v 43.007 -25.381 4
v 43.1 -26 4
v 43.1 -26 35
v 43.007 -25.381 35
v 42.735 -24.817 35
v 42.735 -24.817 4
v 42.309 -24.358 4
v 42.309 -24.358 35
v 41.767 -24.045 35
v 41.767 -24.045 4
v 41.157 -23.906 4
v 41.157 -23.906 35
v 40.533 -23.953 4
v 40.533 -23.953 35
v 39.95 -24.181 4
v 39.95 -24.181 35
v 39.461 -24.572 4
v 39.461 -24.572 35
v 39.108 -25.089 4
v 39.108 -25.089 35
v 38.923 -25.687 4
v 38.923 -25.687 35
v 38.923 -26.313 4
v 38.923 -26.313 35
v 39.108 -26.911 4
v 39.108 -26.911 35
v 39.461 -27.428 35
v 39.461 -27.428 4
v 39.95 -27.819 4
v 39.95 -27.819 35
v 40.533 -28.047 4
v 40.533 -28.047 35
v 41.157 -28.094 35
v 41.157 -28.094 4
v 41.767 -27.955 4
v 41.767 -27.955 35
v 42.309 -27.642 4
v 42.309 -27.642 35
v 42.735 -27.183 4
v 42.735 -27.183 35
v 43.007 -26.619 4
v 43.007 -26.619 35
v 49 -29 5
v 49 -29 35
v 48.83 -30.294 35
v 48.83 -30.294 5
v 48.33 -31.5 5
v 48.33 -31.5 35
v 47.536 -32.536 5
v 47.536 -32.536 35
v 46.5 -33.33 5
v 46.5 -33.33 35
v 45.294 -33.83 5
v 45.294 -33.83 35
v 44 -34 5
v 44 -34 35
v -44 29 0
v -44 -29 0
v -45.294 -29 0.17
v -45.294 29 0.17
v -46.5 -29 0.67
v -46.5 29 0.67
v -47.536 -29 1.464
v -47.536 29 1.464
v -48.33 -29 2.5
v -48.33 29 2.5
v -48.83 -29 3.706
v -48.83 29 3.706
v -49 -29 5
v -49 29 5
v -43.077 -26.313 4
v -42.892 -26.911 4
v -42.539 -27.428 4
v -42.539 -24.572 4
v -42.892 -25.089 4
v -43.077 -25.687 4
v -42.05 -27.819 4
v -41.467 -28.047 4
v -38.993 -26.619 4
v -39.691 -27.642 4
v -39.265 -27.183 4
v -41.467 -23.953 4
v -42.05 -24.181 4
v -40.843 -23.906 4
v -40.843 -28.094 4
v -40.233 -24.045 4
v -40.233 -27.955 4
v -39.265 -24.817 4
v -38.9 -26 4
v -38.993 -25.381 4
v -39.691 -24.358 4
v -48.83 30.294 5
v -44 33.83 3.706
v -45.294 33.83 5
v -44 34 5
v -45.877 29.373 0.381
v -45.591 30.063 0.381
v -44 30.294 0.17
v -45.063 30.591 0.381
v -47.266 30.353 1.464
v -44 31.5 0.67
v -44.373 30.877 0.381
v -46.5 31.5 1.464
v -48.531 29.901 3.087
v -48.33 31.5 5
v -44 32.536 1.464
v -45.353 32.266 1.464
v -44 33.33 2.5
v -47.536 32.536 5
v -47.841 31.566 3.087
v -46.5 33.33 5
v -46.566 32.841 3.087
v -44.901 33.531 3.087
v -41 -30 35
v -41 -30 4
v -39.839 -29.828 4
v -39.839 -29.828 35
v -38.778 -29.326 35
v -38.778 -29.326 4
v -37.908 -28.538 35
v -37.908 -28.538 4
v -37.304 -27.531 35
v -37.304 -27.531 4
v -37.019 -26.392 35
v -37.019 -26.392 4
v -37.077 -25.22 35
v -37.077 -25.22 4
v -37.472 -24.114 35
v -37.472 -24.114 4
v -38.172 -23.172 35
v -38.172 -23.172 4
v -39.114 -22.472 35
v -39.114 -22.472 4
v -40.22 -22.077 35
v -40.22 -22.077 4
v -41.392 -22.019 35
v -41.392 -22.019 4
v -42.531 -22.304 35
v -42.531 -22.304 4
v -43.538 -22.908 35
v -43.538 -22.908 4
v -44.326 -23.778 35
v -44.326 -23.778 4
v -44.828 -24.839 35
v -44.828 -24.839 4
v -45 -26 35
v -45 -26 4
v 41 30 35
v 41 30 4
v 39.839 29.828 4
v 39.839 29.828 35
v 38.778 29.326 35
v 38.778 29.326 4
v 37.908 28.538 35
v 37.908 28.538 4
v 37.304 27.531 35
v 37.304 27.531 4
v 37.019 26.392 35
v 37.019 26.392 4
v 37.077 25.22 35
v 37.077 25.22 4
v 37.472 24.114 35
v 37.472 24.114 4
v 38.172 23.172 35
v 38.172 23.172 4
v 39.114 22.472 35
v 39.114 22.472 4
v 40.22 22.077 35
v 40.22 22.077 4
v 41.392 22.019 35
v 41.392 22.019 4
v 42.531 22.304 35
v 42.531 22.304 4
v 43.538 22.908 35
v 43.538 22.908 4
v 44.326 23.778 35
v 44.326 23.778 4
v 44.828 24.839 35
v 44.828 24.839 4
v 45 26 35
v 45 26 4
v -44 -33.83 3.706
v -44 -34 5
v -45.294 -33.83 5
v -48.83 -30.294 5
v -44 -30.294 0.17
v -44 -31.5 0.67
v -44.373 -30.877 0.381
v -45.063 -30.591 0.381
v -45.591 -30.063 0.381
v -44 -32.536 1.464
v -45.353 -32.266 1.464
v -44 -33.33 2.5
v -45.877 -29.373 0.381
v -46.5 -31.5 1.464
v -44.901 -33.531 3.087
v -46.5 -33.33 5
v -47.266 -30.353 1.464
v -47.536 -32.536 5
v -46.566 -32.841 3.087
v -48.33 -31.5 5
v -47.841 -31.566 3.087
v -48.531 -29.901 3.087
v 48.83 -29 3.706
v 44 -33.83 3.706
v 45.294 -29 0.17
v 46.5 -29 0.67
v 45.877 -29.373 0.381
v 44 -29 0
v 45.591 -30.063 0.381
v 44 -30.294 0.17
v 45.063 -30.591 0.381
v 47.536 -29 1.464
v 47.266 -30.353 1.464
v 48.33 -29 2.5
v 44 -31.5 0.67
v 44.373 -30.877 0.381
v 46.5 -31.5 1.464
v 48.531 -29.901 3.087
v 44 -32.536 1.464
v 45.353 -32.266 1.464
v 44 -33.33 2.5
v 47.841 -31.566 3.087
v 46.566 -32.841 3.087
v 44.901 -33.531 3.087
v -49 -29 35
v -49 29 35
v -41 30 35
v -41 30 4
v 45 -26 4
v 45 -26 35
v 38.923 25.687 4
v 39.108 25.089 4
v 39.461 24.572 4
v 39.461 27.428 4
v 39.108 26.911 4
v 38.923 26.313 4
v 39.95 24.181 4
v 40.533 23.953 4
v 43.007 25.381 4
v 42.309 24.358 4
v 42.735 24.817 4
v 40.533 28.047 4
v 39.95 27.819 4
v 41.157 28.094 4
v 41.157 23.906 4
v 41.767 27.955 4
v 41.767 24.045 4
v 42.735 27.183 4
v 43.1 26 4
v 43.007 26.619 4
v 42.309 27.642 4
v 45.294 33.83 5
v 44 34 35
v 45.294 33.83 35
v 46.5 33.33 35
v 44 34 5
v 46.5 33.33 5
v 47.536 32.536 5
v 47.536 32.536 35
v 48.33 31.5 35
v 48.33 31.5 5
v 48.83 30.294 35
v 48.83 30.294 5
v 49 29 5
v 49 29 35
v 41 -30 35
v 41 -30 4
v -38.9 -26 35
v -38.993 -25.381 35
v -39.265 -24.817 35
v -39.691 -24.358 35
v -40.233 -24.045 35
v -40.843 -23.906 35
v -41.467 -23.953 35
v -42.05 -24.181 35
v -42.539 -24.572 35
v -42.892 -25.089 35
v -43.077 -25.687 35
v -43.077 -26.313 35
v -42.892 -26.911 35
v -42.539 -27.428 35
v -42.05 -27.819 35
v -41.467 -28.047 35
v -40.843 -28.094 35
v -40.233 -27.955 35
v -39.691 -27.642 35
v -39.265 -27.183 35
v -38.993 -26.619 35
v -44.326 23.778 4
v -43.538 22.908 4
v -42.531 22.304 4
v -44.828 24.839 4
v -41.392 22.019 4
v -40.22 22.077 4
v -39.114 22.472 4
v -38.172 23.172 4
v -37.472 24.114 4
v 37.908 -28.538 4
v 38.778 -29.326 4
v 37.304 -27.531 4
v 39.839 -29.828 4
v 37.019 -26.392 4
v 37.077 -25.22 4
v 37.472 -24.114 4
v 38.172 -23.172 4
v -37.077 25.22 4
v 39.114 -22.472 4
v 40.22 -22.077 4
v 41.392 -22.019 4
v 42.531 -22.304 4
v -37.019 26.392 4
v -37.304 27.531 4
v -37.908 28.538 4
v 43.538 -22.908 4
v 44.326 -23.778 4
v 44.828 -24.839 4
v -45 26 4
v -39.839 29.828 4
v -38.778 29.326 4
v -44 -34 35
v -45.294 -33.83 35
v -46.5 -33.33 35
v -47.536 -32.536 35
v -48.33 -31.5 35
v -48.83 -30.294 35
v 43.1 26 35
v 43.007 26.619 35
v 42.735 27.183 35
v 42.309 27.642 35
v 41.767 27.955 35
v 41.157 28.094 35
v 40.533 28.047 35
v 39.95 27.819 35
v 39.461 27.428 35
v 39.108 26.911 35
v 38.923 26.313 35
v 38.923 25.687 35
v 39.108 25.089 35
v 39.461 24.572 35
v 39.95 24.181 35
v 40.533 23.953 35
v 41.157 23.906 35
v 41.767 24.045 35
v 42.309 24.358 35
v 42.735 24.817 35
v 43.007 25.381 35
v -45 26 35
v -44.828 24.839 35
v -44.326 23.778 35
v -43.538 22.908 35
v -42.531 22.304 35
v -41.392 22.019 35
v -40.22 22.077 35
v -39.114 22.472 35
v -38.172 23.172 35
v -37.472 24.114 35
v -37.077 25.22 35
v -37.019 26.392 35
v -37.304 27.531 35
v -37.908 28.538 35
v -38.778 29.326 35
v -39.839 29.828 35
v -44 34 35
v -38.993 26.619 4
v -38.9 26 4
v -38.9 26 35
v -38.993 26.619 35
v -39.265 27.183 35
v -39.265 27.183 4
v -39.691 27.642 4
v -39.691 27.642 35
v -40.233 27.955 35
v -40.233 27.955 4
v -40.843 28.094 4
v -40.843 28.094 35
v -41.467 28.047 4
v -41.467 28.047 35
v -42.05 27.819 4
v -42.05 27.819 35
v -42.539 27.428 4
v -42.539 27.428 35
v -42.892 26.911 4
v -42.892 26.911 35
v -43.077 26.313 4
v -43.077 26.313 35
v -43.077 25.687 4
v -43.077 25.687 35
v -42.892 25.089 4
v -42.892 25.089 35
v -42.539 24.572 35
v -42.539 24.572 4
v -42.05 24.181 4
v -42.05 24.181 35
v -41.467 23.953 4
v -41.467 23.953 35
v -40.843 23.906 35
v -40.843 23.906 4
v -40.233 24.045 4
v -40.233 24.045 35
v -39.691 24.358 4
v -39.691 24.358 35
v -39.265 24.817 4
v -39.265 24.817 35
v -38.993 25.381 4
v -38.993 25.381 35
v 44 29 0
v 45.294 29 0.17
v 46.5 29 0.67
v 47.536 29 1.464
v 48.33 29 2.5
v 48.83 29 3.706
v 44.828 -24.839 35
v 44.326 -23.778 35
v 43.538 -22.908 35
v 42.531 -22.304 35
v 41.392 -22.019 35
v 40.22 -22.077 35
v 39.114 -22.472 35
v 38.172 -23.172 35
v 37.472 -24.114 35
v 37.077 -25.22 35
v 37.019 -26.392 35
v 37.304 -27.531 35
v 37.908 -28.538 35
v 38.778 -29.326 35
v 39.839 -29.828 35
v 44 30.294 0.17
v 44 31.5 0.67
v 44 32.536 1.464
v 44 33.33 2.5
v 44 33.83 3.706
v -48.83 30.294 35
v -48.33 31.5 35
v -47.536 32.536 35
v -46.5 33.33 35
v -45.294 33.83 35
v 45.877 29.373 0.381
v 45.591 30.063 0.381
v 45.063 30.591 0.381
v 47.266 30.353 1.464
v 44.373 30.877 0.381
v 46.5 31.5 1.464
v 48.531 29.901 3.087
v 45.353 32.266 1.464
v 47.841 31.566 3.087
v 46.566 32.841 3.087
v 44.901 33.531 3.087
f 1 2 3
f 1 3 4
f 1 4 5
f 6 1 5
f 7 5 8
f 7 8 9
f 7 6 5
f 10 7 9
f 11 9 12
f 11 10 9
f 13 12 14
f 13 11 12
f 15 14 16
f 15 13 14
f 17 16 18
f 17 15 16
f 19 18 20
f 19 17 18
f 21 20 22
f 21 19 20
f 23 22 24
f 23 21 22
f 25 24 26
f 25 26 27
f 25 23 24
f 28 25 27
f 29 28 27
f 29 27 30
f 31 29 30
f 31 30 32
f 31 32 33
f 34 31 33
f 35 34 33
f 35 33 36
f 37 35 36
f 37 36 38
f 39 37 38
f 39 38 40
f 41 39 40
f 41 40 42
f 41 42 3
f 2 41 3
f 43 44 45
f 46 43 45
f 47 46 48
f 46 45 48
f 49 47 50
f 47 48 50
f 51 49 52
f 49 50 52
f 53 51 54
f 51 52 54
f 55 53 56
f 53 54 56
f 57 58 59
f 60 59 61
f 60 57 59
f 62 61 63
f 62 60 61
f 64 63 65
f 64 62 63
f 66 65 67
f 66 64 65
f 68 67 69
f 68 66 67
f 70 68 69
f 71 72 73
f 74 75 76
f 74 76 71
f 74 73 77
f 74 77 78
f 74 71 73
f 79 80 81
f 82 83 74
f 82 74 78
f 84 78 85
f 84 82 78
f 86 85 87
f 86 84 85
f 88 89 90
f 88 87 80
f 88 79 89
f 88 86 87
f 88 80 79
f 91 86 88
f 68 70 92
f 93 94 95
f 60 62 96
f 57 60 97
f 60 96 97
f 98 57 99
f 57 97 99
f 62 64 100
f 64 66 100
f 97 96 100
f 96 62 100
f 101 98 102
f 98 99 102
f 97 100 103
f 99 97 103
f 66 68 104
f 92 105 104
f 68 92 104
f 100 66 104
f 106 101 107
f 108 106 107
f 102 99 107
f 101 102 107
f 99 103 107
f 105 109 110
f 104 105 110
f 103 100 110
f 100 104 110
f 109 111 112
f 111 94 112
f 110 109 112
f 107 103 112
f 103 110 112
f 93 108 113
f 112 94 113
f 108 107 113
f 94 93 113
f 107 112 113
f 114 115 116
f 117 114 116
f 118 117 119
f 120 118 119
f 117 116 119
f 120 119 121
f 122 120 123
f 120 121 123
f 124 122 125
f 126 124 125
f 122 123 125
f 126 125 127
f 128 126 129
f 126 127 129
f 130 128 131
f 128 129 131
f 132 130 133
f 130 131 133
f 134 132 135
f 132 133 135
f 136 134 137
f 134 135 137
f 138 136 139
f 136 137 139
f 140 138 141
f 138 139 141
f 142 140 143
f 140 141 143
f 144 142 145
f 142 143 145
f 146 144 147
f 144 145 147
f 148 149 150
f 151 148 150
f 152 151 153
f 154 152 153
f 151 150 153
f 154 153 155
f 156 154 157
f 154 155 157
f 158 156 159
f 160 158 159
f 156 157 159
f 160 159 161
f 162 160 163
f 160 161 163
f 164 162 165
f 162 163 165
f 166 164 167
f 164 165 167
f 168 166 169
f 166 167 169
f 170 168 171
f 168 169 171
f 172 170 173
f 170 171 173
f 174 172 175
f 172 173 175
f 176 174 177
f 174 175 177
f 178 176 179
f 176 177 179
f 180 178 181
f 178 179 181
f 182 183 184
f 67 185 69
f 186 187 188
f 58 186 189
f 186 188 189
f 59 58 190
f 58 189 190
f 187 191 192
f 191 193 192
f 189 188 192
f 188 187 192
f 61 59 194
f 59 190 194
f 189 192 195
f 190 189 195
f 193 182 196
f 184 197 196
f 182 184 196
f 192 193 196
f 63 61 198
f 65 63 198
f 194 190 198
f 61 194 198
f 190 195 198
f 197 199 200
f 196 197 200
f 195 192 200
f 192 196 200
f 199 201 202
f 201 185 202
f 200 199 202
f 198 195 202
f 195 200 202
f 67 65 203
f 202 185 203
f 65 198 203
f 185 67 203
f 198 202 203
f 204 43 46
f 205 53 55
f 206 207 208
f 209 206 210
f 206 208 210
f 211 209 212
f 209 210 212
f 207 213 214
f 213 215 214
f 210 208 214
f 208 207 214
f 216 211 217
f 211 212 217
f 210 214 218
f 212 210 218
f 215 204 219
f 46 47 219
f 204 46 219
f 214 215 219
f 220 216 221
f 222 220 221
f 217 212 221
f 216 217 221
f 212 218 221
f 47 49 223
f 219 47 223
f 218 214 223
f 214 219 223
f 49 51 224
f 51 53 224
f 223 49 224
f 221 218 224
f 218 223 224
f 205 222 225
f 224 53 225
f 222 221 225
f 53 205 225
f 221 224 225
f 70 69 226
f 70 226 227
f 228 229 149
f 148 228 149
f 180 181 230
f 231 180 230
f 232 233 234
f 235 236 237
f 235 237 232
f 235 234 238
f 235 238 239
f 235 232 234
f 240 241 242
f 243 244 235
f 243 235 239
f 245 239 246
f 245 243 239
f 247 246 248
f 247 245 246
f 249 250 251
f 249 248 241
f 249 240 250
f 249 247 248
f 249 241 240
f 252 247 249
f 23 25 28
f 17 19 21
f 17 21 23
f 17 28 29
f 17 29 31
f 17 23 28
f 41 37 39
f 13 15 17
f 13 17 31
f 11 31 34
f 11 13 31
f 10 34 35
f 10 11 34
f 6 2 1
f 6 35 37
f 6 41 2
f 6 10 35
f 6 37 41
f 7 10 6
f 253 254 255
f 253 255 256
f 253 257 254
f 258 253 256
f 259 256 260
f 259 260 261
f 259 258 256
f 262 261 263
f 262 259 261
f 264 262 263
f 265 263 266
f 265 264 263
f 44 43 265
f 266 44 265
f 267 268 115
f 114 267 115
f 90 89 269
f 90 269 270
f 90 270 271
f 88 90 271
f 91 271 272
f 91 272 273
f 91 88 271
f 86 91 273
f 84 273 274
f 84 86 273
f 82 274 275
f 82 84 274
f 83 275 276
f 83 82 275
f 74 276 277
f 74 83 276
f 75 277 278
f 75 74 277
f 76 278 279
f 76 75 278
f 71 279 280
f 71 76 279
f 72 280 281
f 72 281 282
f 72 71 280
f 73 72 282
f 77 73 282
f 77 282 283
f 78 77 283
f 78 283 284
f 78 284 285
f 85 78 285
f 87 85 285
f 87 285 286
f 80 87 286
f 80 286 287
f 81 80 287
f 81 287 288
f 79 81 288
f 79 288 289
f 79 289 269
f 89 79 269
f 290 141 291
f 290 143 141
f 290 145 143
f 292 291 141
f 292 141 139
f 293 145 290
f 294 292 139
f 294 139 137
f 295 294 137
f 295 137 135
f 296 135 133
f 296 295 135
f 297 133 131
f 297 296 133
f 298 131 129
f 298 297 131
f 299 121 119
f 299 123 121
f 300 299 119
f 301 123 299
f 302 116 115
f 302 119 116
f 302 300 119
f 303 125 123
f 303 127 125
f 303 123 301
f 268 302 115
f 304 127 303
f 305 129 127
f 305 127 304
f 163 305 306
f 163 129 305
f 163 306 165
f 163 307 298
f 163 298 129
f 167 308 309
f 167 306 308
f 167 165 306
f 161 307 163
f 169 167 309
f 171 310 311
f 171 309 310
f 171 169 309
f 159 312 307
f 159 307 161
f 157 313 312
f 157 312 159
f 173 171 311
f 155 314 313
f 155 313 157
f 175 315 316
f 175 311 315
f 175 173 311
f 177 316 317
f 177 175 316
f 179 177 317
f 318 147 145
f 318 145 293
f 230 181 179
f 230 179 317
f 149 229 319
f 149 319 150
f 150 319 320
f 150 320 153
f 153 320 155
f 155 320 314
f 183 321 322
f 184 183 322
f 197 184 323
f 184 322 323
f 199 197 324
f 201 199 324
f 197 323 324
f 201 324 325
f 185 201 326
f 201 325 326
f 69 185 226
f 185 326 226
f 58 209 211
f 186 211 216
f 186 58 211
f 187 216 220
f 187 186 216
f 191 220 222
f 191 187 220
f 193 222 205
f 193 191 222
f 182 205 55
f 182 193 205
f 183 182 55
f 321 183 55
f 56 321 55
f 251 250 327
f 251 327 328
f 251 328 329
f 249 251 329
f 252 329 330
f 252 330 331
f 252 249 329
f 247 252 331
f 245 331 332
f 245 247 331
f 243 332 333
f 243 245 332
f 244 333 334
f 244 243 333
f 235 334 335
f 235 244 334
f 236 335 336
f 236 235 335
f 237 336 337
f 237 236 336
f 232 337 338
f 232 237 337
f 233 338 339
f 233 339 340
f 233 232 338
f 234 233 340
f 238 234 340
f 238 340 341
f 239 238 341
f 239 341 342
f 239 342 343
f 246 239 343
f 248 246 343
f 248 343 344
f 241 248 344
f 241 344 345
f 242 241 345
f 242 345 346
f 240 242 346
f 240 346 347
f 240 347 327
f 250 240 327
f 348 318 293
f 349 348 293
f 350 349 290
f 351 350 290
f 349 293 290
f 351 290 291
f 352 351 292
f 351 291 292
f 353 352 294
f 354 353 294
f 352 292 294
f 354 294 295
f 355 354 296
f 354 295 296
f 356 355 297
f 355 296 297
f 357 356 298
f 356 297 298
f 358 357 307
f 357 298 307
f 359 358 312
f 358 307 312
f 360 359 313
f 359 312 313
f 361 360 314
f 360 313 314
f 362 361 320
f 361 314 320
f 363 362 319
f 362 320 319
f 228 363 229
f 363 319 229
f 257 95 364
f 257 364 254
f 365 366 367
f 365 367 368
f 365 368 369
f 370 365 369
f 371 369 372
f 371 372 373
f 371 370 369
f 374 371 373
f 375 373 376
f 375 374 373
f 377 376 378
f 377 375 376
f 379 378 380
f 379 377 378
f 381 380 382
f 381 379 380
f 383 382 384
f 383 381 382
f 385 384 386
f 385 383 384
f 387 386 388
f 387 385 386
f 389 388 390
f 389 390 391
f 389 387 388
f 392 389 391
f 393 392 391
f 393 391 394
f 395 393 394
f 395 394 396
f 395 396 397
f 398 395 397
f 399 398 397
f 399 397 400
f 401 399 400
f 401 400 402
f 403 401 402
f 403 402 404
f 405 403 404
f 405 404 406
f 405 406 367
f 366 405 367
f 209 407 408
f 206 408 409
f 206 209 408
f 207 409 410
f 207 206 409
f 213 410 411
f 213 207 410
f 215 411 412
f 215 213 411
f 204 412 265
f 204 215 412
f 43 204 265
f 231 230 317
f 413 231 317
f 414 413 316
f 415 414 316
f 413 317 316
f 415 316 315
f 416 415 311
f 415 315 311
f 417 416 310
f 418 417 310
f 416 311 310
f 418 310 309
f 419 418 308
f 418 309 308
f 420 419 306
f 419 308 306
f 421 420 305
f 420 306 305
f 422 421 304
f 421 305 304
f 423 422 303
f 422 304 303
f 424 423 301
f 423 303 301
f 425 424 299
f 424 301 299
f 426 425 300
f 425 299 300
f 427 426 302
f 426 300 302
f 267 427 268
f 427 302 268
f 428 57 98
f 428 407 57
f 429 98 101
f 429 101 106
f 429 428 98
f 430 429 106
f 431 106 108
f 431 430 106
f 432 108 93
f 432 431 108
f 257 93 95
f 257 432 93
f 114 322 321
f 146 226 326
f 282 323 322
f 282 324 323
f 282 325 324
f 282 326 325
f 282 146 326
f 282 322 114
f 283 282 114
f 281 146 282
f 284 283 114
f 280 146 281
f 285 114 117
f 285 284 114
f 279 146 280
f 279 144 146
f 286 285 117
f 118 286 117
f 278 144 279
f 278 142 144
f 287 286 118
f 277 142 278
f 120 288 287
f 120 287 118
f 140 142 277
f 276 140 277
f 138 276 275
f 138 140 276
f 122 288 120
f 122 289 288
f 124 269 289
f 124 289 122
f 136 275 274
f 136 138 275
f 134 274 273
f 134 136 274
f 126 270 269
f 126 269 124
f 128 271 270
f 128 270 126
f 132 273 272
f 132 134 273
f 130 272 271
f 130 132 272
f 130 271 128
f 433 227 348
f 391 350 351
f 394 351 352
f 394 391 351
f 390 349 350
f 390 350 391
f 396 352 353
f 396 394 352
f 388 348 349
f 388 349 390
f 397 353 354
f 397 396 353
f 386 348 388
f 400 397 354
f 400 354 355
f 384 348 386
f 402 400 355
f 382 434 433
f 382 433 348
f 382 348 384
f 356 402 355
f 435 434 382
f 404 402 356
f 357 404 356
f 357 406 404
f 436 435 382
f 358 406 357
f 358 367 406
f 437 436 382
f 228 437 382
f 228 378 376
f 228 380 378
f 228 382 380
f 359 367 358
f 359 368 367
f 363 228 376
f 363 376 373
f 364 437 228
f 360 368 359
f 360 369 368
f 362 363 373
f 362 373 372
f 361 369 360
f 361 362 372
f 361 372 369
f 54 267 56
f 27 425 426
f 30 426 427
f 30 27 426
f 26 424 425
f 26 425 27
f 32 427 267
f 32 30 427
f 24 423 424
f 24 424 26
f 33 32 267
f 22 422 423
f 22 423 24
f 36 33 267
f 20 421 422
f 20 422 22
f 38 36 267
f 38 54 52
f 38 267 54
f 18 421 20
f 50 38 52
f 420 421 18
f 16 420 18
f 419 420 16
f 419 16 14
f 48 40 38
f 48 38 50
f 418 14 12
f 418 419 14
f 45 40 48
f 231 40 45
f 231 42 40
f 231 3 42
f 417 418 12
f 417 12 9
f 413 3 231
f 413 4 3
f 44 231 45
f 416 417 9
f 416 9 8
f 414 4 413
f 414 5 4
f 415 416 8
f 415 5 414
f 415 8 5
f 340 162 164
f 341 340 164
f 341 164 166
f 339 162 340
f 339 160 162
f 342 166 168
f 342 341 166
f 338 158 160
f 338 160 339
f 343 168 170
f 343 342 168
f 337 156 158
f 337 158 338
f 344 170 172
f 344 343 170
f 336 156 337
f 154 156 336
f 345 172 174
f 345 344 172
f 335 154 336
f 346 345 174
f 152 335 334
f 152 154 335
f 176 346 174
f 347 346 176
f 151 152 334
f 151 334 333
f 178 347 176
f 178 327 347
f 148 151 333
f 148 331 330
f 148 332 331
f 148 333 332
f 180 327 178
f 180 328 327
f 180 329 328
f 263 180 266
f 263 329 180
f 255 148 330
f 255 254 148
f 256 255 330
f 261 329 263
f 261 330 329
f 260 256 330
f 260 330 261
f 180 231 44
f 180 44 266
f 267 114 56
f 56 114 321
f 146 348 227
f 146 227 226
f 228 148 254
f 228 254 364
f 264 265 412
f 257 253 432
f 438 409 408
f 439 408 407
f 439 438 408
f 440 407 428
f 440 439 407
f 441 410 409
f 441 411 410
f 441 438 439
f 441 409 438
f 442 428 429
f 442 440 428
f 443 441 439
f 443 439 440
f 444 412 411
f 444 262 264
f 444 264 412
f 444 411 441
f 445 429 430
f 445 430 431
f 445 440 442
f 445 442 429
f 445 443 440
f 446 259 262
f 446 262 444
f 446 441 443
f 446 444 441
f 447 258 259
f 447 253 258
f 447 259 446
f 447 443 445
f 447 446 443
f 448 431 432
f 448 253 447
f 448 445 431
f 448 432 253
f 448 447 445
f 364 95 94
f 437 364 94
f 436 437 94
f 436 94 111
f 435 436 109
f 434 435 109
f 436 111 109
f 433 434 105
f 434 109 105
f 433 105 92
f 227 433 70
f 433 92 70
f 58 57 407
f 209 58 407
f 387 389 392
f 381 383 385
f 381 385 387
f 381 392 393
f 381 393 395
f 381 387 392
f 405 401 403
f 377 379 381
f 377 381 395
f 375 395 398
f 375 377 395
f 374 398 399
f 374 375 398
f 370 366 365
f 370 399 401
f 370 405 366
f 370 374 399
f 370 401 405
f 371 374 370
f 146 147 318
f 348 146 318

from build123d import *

# Parameters (mm, degrees)
F0_W     = 98
F0_H     = 68
F0_R     = 2.1
F1_DEPTH = 35
F2_W     = 90
F2_H     = 60
F3_DEPTH = 4
F4_R     = 5
F5_R     = 5


with BuildPart() as f1:
    # F0 (on Top) → F1 (new body)
    with BuildSketch(Plane.XY):
        Rectangle(F0_W, F0_H)
        with Locations((-41, -26)):
            Circle(F0_R, mode=Mode.SUBTRACT)
        with Locations((41, -26)):
            Circle(F0_R, mode=Mode.SUBTRACT)
        with BuildLine():
            ThreePointArc((45, -26), (38.171573, -23.171573), (41, -30))
            Line((41, -30), (-41, -30))
            ThreePointArc((-41, -30), (-38.171573, -23.171573), (-45, -26))
            Line((-45, -26), (-45, 26))
            ThreePointArc((-45, 26), (-38.171573, 23.171573), (-41, 30))
            Line((-41, 30), (41, 30))
            ThreePointArc((41, 30), (38.171573, 23.171573), (45, 26))
            Line((45, 26), (45, -26))
        make_face(mode=Mode.SUBTRACT)
        with Locations((-41, 26)):
            Circle(F0_R, mode=Mode.SUBTRACT)
        with Locations((41, 26)):
            Circle(F0_R, mode=Mode.SUBTRACT)
    extrude(amount=F1_DEPTH)

    # F2 (on Top) + F0 (on Top) → F3 (join)
    with BuildSketch(Plane.XY):
        Rectangle(F2_W, F2_H)
    with BuildSketch(Plane.XY):
        Rectangle(F0_W, F0_H)
        with Locations((-41, -26)):
            Circle(F0_R, mode=Mode.SUBTRACT)
        with Locations((41, -26)):
            Circle(F0_R, mode=Mode.SUBTRACT)
        with BuildLine():
            ThreePointArc((45, -26), (38.171573, -23.171573), (41, -30))
            Line((41, -30), (-41, -30))
            ThreePointArc((-41, -30), (-38.171573, -23.171573), (-45, -26))
            Line((-45, -26), (-45, 26))
            ThreePointArc((-45, 26), (-38.171573, 23.171573), (-41, 30))
            Line((-41, 30), (41, 30))
            ThreePointArc((41, 30), (38.171573, 23.171573), (45, 26))
            Line((45, 26), (45, -26))
        make_face(mode=Mode.SUBTRACT)
        with Locations((-41, 26)):
            Circle(F0_R, mode=Mode.SUBTRACT)
        with Locations((41, 26)):
            Circle(F0_R, mode=Mode.SUBTRACT)
    extrude(amount=F3_DEPTH)

    # F4
    f4_edges = [f1.edges().sort_by_distance(p)[0] for p in [
        (49, -34, 17.5),
        (-49, -34, 17.5),
        (-49, 34, 17.5),
    ]]
    fillet(f4_edges, radius=F4_R)

    # F5
    f5_edges = [f1.edges().sort_by_distance(p)[0] for p in [
        (49, 34, 17.5),
        (2.5, 34, 0),
    ]]
    fillet(f5_edges, radius=F5_R)


solid = f1.part
